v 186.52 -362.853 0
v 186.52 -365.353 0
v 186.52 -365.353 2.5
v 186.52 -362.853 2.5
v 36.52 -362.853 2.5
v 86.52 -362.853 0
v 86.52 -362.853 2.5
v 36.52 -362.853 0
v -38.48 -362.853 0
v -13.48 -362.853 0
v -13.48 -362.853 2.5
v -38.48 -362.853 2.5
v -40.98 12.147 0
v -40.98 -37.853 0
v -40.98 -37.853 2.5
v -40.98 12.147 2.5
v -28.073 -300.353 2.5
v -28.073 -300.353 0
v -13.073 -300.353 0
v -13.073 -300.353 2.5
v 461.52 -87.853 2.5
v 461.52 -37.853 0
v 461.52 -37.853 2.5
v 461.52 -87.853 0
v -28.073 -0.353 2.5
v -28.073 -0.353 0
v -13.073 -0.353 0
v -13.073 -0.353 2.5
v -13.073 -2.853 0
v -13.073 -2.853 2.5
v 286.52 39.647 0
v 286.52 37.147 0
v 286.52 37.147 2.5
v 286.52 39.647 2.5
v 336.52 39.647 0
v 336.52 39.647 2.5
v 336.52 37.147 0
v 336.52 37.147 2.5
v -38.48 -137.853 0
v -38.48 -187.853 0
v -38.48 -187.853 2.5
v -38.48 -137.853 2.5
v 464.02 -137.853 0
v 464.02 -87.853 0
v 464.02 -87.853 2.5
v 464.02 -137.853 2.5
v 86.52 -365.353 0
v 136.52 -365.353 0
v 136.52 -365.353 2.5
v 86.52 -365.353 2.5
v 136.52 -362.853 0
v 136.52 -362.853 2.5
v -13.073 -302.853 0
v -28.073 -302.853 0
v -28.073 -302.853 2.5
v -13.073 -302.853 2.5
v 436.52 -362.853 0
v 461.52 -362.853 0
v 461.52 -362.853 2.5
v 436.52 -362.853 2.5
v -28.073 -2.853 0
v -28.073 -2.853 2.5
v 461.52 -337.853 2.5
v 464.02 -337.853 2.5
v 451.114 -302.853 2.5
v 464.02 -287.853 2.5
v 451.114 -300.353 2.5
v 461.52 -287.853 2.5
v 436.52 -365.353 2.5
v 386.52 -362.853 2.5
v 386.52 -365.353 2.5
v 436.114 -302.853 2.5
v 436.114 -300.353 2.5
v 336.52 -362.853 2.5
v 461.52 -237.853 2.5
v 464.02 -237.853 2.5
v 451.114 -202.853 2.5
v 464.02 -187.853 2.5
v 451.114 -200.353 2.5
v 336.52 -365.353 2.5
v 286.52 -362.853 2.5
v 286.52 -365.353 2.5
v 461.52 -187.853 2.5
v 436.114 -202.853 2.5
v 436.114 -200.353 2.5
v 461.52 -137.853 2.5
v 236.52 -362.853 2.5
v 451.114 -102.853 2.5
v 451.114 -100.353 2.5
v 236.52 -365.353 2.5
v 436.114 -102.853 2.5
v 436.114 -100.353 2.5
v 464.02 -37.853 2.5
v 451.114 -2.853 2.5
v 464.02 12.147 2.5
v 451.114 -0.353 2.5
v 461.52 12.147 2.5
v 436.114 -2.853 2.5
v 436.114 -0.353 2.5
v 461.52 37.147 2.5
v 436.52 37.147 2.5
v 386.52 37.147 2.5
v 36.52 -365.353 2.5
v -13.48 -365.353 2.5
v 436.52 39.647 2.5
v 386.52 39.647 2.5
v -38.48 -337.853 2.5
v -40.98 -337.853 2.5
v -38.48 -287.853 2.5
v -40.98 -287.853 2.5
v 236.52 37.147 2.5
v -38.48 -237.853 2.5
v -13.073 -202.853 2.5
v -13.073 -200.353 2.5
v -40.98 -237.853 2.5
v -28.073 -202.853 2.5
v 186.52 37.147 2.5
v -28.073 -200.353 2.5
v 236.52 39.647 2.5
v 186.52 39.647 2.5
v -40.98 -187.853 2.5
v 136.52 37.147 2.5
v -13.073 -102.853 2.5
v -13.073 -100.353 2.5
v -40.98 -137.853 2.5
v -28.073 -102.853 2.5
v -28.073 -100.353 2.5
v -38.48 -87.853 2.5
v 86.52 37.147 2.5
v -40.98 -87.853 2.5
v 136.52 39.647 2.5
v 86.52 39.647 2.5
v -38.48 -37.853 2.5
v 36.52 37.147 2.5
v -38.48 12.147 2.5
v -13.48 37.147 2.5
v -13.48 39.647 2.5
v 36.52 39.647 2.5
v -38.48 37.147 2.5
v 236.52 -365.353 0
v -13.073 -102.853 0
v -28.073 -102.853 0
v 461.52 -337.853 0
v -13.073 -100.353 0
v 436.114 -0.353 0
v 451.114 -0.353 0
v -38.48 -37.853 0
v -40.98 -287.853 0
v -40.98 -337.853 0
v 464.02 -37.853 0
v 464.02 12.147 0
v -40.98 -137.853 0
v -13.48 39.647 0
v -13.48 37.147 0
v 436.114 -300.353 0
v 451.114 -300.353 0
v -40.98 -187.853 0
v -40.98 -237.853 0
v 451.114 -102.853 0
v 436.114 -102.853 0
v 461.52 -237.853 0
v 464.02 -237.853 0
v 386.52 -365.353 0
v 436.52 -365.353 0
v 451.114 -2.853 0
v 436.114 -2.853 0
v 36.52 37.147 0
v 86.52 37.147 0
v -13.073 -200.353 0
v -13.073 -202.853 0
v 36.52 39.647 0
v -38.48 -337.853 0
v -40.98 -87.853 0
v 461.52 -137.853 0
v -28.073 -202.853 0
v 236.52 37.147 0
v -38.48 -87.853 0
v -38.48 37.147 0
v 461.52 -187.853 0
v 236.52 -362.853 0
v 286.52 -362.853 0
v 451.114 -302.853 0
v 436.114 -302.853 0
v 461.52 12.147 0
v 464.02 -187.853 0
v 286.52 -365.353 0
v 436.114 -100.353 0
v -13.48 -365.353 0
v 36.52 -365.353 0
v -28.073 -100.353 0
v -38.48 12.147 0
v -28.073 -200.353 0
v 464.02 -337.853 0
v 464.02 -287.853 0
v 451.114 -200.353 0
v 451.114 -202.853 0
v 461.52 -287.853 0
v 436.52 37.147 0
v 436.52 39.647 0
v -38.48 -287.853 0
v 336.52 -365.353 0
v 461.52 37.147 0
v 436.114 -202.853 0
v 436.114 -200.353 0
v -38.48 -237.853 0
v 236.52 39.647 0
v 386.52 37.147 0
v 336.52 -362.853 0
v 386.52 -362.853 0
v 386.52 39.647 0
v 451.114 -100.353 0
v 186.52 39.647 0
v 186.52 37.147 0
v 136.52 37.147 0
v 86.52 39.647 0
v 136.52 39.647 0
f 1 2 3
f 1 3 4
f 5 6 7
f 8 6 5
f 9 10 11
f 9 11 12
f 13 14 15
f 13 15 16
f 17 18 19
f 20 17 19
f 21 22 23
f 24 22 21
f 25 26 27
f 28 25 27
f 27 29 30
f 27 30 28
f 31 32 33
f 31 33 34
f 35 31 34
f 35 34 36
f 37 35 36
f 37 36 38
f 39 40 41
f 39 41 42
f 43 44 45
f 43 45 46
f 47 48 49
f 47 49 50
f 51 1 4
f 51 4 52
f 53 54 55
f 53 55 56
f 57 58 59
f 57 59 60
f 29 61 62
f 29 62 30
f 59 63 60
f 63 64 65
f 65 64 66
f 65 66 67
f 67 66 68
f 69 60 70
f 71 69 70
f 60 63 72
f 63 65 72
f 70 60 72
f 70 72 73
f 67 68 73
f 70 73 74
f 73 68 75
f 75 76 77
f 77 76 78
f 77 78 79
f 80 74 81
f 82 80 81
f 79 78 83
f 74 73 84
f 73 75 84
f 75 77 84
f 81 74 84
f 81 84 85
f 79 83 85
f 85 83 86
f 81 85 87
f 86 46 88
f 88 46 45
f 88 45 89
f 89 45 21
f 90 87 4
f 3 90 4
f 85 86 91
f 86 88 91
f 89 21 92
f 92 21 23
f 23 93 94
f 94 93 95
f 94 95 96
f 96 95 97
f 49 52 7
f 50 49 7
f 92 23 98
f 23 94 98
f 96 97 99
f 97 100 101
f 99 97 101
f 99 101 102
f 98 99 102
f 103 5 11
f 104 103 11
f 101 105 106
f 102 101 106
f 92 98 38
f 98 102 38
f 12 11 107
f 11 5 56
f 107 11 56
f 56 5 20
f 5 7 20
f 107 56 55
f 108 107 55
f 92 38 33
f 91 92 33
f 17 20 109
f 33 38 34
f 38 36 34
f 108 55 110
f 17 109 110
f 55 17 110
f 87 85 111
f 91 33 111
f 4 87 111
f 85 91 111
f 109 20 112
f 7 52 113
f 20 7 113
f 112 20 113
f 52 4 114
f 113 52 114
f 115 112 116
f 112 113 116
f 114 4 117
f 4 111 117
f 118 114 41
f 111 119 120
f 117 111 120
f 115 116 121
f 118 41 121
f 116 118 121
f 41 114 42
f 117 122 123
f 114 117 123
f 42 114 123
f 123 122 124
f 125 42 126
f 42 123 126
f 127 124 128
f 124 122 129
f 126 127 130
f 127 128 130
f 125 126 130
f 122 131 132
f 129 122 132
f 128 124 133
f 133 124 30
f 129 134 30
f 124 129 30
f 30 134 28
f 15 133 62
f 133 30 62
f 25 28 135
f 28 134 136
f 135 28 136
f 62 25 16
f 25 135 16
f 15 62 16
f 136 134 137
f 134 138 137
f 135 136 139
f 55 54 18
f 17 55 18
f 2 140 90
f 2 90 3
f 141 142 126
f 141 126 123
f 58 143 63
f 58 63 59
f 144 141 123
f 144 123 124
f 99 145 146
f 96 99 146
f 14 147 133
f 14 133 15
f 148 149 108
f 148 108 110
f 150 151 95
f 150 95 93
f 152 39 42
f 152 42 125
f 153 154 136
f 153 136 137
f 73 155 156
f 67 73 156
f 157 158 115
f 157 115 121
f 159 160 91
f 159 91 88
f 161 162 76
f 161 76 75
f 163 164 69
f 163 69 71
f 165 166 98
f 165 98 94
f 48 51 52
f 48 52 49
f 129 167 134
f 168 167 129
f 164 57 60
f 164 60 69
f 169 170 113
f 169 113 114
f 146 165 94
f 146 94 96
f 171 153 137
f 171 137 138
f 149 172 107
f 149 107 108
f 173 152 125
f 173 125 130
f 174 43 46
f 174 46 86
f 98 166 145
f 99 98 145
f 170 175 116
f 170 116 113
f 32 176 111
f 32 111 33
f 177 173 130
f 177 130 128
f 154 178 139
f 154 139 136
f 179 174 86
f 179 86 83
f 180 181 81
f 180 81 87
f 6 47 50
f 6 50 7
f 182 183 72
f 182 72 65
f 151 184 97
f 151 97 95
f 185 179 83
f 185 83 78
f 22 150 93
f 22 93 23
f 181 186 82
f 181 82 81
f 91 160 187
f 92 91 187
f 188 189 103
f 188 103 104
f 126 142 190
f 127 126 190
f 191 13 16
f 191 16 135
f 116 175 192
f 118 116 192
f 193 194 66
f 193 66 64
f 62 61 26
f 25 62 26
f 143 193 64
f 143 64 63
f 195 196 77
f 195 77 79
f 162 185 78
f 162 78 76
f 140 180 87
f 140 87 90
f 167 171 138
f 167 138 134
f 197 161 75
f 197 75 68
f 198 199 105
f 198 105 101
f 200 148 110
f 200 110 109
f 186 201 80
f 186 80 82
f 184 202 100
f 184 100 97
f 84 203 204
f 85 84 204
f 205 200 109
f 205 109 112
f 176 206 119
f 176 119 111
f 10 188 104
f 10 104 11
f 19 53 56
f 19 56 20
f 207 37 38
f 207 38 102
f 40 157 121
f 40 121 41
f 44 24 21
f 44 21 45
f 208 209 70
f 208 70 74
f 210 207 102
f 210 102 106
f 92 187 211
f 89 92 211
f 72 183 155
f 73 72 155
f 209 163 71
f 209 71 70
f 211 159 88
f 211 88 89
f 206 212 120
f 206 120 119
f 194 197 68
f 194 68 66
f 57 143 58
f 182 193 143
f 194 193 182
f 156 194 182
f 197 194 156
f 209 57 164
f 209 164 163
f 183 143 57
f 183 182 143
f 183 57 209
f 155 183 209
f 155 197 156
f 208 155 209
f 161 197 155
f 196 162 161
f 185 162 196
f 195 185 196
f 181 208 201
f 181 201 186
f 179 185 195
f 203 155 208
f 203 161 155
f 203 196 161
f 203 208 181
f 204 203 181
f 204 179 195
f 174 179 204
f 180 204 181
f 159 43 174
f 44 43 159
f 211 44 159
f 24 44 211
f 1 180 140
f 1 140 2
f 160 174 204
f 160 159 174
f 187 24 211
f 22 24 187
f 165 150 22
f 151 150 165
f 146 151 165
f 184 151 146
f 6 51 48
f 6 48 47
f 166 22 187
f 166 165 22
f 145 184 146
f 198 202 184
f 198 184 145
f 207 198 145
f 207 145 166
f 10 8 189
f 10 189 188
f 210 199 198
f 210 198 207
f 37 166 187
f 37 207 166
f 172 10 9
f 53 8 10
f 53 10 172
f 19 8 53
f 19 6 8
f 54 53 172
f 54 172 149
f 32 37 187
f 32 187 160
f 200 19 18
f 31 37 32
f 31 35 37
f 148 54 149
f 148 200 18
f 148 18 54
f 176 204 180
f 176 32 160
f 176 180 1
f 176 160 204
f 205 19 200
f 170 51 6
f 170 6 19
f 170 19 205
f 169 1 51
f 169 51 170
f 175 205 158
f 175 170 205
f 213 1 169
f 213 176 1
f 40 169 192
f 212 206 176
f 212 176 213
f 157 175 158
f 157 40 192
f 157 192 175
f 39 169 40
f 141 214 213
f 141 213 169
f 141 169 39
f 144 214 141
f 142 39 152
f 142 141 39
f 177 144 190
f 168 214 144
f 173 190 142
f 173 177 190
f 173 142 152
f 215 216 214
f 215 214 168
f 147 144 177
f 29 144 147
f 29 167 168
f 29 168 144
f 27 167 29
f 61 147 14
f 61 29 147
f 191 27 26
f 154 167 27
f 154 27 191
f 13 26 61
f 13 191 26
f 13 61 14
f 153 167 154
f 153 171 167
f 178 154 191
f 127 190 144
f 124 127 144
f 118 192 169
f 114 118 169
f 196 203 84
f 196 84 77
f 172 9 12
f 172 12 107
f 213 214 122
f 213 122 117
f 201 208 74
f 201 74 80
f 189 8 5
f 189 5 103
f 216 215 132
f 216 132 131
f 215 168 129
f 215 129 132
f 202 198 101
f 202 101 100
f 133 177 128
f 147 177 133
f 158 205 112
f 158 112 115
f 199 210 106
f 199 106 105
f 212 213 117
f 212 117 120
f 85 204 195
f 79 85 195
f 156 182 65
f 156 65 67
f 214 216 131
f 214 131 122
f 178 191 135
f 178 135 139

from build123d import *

# Parameters (mm, degrees)
SKETCH1_W               = 15
SKETCH1_H               = 2.5
F_50X40_TOP_PLANE_DEPTH = 2.5


with BuildPart() as part:
    # Sketch1 → 50X40 top plane (new body)
    with BuildSketch(Plane.XY):
        Polygon((86.520385927, 37.146891895), (86.520385927, 39.646891895), (136.520385927, 39.646891895), (136.520385927, 37.146891895), (186.520385927, 37.146891895), (186.520385927, 39.646891895), (236.520385927, 39.646891895), (236.520385927, 37.146891895), (286.520385927, 37.146891895), (286.520385927, 39.646891895), (336.520385927, 39.646891895), (336.520385927, 37.146891895), (386.520385927, 37.146891895), (386.520385927, 39.646891895), (436.520385927, 39.646891895), (436.520385927, 37.146891895), (461.520385927, 37.146891895), (461.520385927, 12.146891895), (464.020385927, 12.146891895), (464.020385927, -37.853108105), (461.520385927, -37.853108105), (461.520385927, -87.853108105), (464.020385927, -87.853108105), (464.020385927, -137.853108105), (461.520385927, -137.853108105), (461.520385927, -187.853108105), (464.020385927, -187.853108105), (464.020385927, -237.853108105), (461.520385927, -237.853108105), (461.520385927, -287.853108105), (464.020385927, -287.853108105), (464.020385927, -337.853108105), (461.520385927, -337.853108105), (461.520385927, -362.853108105), (436.520385927, -362.853108105), (436.520385927, -365.353108105), (386.520385927, -365.353108105), (386.520385927, -362.853108105), (336.520385927, -362.853108105), (336.520385927, -365.353108105), (286.520385927, -365.353108105), (286.520385927, -362.853108105), (236.520385927, -362.853108105), (236.520385927, -365.353108105), (186.520385927, -365.353108105), (186.520385927, -362.853108105), (136.520385927, -362.853108105), (136.520385927, -365.353108105), (86.520385927, -365.353108105), (86.520385927, -362.853108105), (36.520385927, -362.853108105), (36.520385927, -365.353108105), (-13.479614073, -365.353108105), (-13.479614073, -362.853108105), (-38.479614073, -362.853108105), (-38.479614073, -337.853108105), (-40.979614073, -337.853108105), (-40.979614073, -287.853108105), (-38.479614073, -287.853108105), (-38.479614073, -237.853108105), (-40.979614073, -237.853108105), (-40.979614073, -187.853108105), (-38.479614073, -187.853108105), (-38.479614073, -137.853108105), (-40.979614073, -137.853108105), (-40.979614073, -87.853108105), (-38.479614073, -87.853108105), (-38.479614073, -37.853108105), (-40.979614073, -37.853108105), (-40.979614073, 12.146891895), (-38.479614073, 12.146891895), (-38.479614073, 37.146891895), (-13.479614073, 37.146891895), (-13.479614073, 39.646891895), (36.520385927, 39.646891895), (36.520385927, 37.146891895), align=None)
        with Locations((443.61350048, -101.603108105)):
            Rectangle(SKETCH1_W, SKETCH1_H, mode=Mode.SUBTRACT)
        with Locations((443.61350048, -1.603108105)):
            Rectangle(SKETCH1_W, SKETCH1_H, mode=Mode.SUBTRACT)
        with Locations((443.61350048, -201.603108105)):
            Rectangle(SKETCH1_W, SKETCH1_H, mode=Mode.SUBTRACT)
        with Locations((443.61350048, -301.603108105)):
            Rectangle(SKETCH1_W, SKETCH1_H, mode=Mode.SUBTRACT)
        with Locations((-20.572728625, -301.603108105)):
            Rectangle(SKETCH1_W, SKETCH1_H, mode=Mode.SUBTRACT)
        with Locations((-20.572728625, -201.603108105)):
            Rectangle(SKETCH1_W, SKETCH1_H, mode=Mode.SUBTRACT)
        with Locations((-20.572728625, -101.603108105)):
            Rectangle(SKETCH1_W, SKETCH1_H, mode=Mode.SUBTRACT)
        with Locations((-20.572728625, -1.603108105)):
            Rectangle(SKETCH1_W, SKETCH1_H, mode=Mode.SUBTRACT)
    extrude(amount=F_50X40_TOP_PLANE_DEPTH)


solid = part.part
